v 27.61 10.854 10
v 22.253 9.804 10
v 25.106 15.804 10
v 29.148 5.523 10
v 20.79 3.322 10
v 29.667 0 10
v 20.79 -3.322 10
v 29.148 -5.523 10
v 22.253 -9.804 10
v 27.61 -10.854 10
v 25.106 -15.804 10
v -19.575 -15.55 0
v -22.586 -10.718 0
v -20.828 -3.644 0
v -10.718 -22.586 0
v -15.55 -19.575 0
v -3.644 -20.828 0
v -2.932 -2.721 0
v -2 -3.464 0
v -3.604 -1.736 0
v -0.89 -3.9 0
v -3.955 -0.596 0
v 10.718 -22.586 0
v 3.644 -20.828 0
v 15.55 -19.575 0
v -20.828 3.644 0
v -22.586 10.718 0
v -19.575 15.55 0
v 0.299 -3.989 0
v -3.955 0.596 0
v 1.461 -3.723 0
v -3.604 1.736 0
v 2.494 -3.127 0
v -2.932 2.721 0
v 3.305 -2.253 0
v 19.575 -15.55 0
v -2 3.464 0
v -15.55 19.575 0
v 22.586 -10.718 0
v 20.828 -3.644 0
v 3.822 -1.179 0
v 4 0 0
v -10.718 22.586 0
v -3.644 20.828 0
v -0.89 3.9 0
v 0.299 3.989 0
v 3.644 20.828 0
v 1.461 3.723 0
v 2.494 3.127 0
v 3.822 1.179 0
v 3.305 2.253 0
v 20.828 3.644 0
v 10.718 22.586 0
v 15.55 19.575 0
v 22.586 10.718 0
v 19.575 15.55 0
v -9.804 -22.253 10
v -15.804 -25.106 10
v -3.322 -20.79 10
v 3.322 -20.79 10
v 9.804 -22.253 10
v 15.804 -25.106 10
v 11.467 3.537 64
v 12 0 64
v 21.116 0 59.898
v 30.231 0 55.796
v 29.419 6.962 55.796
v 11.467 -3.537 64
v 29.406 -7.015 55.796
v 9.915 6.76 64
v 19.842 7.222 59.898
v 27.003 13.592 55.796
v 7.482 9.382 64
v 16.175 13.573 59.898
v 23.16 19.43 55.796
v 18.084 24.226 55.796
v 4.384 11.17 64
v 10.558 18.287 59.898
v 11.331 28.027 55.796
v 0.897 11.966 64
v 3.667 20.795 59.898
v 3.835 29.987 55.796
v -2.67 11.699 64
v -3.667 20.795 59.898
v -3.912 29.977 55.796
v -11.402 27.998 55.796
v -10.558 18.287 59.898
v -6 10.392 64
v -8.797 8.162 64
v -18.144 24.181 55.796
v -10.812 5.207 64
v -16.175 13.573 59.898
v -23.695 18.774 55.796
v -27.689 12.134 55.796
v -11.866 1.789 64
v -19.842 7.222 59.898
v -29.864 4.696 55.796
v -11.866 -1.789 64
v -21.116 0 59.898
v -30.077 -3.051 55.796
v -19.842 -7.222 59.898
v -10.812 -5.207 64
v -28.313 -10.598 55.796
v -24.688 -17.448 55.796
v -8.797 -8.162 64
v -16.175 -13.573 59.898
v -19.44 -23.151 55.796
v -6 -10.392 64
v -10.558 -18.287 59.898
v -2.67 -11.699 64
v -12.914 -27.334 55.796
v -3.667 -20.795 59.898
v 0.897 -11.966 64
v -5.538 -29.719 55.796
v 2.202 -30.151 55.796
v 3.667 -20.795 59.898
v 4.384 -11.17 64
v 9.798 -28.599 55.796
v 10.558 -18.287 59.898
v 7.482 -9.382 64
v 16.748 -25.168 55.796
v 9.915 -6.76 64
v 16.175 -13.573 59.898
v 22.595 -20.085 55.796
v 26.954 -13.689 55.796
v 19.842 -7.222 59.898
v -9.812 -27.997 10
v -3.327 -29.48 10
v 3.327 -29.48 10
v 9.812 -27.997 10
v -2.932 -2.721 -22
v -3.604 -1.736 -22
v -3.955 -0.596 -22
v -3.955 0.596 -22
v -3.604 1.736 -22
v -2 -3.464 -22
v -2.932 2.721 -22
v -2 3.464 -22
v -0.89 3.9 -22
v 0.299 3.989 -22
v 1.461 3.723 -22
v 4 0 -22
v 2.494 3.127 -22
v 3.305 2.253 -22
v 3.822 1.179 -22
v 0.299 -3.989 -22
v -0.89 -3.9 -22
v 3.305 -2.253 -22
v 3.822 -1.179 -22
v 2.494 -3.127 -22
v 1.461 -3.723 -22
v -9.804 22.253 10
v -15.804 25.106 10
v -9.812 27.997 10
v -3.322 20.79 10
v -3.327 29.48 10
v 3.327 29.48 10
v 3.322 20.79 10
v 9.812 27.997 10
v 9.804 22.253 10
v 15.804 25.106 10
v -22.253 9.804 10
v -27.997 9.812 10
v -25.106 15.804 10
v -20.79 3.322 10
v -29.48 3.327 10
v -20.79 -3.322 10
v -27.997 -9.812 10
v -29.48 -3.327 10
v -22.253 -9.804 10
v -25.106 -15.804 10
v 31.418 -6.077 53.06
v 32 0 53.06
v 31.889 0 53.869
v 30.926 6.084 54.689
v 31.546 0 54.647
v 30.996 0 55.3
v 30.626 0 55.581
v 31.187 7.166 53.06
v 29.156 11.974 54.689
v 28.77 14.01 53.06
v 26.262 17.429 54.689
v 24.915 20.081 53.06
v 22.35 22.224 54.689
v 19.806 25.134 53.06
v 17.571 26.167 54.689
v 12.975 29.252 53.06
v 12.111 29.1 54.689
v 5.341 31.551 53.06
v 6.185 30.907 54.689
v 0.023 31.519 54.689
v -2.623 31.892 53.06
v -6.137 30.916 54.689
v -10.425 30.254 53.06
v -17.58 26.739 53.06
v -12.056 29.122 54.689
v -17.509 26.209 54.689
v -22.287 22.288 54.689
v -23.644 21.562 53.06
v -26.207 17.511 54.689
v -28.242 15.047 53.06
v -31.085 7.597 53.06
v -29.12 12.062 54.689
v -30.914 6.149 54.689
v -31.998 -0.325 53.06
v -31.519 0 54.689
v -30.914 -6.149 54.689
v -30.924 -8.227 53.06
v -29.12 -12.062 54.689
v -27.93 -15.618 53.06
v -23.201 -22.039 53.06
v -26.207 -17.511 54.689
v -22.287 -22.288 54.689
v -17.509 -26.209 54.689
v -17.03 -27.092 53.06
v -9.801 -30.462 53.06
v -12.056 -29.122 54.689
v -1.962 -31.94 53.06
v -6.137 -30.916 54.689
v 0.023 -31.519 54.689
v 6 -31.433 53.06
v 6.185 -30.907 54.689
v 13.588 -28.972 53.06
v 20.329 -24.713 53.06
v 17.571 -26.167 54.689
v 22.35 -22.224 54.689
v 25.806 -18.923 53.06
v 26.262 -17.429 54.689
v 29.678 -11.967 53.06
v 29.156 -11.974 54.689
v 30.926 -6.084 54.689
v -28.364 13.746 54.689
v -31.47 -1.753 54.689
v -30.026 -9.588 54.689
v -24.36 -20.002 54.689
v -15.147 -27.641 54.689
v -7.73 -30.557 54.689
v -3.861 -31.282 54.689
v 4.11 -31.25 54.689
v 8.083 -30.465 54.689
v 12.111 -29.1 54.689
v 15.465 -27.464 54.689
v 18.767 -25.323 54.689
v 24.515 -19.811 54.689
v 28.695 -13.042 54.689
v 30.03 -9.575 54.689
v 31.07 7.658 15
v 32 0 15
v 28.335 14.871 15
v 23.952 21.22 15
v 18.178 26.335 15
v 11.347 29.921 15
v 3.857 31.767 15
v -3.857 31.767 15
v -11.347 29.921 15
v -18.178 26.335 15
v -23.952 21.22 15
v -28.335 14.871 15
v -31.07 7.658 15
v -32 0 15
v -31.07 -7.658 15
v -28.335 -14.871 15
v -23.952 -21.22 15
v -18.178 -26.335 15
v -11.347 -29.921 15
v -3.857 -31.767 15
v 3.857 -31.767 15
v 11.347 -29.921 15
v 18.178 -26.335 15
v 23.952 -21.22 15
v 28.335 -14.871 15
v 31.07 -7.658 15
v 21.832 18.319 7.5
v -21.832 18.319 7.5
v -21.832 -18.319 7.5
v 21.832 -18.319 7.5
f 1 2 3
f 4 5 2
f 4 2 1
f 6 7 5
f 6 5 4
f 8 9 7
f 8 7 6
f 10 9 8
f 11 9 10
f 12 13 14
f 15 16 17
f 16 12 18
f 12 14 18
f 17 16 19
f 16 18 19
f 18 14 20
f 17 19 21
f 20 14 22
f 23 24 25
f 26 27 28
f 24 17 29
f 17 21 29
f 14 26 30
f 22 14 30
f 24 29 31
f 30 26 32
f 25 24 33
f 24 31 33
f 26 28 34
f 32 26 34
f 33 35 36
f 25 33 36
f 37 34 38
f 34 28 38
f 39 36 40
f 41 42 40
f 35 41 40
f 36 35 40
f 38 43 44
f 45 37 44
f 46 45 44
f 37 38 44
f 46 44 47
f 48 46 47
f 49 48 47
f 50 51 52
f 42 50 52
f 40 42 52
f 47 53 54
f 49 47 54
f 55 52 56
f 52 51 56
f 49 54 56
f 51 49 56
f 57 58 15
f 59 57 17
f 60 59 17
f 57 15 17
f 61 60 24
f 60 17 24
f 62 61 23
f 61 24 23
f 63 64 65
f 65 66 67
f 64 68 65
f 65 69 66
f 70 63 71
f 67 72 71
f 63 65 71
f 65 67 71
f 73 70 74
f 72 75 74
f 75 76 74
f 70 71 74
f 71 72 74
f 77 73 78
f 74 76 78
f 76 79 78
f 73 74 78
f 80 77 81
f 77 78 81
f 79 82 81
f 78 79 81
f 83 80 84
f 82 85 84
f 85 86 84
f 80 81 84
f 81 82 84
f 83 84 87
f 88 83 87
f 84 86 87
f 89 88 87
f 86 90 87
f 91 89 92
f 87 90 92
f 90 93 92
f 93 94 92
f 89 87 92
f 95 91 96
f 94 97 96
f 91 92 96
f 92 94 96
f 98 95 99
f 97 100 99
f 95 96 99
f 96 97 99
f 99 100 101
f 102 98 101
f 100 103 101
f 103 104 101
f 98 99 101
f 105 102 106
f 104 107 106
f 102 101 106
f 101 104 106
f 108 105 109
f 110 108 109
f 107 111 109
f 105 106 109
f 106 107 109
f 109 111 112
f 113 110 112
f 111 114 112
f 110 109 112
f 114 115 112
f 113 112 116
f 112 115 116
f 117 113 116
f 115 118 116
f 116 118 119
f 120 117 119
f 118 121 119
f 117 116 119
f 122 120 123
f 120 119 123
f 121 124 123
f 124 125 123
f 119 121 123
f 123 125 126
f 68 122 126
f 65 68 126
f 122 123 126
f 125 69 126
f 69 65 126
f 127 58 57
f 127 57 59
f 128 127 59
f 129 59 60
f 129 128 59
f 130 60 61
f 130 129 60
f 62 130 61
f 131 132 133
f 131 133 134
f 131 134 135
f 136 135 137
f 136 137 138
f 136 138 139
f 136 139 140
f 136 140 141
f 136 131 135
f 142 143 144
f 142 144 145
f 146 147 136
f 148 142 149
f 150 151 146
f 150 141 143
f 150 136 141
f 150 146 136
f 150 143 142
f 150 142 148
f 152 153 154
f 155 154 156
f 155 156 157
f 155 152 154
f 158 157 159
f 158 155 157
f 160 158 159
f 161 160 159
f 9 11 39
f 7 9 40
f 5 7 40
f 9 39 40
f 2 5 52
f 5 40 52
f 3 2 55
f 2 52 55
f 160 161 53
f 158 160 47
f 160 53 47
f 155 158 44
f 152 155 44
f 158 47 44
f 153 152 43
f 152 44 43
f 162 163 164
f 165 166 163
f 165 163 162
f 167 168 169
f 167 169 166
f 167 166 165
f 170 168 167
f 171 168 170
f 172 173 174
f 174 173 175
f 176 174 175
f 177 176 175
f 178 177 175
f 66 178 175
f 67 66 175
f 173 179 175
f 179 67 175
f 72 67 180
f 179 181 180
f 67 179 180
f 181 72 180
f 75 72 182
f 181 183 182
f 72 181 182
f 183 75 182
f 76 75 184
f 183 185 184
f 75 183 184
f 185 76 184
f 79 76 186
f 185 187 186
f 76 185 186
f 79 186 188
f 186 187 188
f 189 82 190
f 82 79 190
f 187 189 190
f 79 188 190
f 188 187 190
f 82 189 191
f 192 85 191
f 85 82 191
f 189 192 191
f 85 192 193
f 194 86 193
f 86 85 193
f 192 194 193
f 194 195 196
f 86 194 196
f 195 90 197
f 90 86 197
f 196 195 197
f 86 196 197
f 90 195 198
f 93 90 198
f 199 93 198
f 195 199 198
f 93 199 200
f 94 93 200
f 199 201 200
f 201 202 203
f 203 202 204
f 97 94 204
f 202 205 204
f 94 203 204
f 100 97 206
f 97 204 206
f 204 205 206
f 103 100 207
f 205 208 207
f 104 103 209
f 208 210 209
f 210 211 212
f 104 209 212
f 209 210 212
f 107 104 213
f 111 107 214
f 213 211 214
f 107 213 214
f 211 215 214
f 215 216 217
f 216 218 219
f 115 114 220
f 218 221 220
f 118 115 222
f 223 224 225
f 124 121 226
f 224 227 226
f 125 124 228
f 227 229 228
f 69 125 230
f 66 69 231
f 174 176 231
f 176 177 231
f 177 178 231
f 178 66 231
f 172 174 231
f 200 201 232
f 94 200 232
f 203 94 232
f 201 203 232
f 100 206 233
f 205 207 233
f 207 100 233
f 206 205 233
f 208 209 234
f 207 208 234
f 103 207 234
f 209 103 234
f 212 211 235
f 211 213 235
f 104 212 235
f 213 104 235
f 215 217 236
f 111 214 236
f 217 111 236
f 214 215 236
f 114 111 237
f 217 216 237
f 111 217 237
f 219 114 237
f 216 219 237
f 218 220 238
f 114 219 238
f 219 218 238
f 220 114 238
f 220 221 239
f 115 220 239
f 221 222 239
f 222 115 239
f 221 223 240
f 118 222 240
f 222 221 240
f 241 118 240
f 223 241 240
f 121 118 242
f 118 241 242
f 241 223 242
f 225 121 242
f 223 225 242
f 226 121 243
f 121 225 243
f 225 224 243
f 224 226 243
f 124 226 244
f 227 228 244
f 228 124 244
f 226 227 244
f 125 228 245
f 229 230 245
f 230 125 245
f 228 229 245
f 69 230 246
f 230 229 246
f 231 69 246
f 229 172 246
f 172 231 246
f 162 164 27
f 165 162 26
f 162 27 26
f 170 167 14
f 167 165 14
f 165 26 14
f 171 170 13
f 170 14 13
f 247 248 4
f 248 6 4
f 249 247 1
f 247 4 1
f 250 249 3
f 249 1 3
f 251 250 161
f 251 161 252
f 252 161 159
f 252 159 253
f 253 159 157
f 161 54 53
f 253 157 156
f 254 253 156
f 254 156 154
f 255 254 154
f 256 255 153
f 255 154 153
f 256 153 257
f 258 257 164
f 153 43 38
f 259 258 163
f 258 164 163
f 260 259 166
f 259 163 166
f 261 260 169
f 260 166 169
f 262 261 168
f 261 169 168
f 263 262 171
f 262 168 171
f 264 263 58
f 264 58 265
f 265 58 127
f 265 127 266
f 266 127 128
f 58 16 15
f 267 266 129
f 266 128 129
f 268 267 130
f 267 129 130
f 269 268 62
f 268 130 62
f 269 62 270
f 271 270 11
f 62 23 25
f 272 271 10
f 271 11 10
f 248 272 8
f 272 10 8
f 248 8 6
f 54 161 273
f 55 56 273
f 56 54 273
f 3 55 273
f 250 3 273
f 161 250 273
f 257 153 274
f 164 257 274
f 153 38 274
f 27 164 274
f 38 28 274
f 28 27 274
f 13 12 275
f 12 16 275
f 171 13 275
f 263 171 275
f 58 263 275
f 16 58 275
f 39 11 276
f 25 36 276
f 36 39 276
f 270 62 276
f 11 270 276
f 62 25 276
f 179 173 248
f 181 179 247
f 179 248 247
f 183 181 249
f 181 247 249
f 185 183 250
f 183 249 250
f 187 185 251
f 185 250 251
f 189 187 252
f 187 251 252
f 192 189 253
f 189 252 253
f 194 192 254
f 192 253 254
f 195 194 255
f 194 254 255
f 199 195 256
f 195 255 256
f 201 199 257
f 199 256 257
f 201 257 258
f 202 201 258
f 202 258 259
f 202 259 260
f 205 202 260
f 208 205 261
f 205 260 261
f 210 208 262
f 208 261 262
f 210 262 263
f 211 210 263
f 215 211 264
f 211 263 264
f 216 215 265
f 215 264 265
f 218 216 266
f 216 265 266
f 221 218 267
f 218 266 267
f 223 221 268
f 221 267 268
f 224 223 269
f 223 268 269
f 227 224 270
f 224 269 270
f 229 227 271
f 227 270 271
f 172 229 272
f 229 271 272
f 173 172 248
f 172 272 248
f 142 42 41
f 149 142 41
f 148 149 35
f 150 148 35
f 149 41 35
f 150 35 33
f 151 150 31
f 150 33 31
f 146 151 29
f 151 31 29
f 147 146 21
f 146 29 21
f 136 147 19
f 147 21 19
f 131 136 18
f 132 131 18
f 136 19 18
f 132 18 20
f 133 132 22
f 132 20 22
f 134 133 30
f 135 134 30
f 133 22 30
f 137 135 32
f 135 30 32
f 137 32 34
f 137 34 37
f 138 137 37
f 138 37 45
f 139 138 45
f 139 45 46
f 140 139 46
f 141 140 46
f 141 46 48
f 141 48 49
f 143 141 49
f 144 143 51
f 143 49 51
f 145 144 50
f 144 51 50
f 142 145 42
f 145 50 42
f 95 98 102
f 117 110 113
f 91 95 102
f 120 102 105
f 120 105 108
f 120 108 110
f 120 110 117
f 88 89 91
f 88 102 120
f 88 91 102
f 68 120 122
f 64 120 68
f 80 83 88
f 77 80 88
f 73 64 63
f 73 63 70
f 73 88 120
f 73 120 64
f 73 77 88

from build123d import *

# Parameters (mm, degrees)
F0_R     = 32
F1_DEPTH = 64
F2_SIZE2 = 9
F2_SIZE  = 20
F3_SIZE2 = 7
F3_SIZE  = 15
F4_R     = 3
F5_R     = 30
F7_DEPTH = 10
F6_R     = 4
F8_DEPTH = 22


with BuildPart() as f1:
    # F0 (on Top) → F1 (new body)
    with BuildSketch(Plane.XY):
        Circle(F0_R)
    extrude(amount=F1_DEPTH)

    # F2
    f2_edges = [f1.edges().sort_by_distance(p)[0] for p in [
        (-32, 0, 64),
    ]]
    f2_side = f1.faces().sort_by_distance((0, 0, 64))[0]
    chamfer(f2_edges, length=F2_SIZE, length2=F2_SIZE2, reference=f2_side)

    # F3
    f3_edges = [f1.edges().sort_by_distance(p)[0] for p in [
        (-32, 0, 0),
    ]]
    f3_side = f1.faces().sort_by_distance((-32, 0, 27.5))[0]
    chamfer(f3_edges, length=F3_SIZE, length2=F3_SIZE2, reference=f3_side)

    # F4
    f4_edges = [f1.edges().sort_by_distance(p)[0] for p in [
        (-32, 0, 55),
    ]]
    fillet(f4_edges, radius=F4_R)

    # F5 (on face) → F7 (cut)
    with BuildSketch(Plane(origin=(0, 0, 0), x_dir=(1, 0, 0), z_dir=(0, 0, -1))):
        with Locations((-50.605738163, 0)):
            Circle(F5_R)
        with Locations((0, -50.605738163)):
            Circle(F5_R)
        with Locations((50.605738163, 0)):
            Circle(F5_R)
        with Locations((0, 50.605738163)):
            Circle(F5_R)
    extrude(amount=-F7_DEPTH, mode=Mode.SUBTRACT)

    # F6 (on face) → F8 (join)
    with BuildSketch(Plane(origin=(0, 0, 0), x_dir=(1, 0, 0), z_dir=(0, 0, -1))):
        Circle(F6_R)
    extrude(amount=F8_DEPTH)


solid = f1.part
